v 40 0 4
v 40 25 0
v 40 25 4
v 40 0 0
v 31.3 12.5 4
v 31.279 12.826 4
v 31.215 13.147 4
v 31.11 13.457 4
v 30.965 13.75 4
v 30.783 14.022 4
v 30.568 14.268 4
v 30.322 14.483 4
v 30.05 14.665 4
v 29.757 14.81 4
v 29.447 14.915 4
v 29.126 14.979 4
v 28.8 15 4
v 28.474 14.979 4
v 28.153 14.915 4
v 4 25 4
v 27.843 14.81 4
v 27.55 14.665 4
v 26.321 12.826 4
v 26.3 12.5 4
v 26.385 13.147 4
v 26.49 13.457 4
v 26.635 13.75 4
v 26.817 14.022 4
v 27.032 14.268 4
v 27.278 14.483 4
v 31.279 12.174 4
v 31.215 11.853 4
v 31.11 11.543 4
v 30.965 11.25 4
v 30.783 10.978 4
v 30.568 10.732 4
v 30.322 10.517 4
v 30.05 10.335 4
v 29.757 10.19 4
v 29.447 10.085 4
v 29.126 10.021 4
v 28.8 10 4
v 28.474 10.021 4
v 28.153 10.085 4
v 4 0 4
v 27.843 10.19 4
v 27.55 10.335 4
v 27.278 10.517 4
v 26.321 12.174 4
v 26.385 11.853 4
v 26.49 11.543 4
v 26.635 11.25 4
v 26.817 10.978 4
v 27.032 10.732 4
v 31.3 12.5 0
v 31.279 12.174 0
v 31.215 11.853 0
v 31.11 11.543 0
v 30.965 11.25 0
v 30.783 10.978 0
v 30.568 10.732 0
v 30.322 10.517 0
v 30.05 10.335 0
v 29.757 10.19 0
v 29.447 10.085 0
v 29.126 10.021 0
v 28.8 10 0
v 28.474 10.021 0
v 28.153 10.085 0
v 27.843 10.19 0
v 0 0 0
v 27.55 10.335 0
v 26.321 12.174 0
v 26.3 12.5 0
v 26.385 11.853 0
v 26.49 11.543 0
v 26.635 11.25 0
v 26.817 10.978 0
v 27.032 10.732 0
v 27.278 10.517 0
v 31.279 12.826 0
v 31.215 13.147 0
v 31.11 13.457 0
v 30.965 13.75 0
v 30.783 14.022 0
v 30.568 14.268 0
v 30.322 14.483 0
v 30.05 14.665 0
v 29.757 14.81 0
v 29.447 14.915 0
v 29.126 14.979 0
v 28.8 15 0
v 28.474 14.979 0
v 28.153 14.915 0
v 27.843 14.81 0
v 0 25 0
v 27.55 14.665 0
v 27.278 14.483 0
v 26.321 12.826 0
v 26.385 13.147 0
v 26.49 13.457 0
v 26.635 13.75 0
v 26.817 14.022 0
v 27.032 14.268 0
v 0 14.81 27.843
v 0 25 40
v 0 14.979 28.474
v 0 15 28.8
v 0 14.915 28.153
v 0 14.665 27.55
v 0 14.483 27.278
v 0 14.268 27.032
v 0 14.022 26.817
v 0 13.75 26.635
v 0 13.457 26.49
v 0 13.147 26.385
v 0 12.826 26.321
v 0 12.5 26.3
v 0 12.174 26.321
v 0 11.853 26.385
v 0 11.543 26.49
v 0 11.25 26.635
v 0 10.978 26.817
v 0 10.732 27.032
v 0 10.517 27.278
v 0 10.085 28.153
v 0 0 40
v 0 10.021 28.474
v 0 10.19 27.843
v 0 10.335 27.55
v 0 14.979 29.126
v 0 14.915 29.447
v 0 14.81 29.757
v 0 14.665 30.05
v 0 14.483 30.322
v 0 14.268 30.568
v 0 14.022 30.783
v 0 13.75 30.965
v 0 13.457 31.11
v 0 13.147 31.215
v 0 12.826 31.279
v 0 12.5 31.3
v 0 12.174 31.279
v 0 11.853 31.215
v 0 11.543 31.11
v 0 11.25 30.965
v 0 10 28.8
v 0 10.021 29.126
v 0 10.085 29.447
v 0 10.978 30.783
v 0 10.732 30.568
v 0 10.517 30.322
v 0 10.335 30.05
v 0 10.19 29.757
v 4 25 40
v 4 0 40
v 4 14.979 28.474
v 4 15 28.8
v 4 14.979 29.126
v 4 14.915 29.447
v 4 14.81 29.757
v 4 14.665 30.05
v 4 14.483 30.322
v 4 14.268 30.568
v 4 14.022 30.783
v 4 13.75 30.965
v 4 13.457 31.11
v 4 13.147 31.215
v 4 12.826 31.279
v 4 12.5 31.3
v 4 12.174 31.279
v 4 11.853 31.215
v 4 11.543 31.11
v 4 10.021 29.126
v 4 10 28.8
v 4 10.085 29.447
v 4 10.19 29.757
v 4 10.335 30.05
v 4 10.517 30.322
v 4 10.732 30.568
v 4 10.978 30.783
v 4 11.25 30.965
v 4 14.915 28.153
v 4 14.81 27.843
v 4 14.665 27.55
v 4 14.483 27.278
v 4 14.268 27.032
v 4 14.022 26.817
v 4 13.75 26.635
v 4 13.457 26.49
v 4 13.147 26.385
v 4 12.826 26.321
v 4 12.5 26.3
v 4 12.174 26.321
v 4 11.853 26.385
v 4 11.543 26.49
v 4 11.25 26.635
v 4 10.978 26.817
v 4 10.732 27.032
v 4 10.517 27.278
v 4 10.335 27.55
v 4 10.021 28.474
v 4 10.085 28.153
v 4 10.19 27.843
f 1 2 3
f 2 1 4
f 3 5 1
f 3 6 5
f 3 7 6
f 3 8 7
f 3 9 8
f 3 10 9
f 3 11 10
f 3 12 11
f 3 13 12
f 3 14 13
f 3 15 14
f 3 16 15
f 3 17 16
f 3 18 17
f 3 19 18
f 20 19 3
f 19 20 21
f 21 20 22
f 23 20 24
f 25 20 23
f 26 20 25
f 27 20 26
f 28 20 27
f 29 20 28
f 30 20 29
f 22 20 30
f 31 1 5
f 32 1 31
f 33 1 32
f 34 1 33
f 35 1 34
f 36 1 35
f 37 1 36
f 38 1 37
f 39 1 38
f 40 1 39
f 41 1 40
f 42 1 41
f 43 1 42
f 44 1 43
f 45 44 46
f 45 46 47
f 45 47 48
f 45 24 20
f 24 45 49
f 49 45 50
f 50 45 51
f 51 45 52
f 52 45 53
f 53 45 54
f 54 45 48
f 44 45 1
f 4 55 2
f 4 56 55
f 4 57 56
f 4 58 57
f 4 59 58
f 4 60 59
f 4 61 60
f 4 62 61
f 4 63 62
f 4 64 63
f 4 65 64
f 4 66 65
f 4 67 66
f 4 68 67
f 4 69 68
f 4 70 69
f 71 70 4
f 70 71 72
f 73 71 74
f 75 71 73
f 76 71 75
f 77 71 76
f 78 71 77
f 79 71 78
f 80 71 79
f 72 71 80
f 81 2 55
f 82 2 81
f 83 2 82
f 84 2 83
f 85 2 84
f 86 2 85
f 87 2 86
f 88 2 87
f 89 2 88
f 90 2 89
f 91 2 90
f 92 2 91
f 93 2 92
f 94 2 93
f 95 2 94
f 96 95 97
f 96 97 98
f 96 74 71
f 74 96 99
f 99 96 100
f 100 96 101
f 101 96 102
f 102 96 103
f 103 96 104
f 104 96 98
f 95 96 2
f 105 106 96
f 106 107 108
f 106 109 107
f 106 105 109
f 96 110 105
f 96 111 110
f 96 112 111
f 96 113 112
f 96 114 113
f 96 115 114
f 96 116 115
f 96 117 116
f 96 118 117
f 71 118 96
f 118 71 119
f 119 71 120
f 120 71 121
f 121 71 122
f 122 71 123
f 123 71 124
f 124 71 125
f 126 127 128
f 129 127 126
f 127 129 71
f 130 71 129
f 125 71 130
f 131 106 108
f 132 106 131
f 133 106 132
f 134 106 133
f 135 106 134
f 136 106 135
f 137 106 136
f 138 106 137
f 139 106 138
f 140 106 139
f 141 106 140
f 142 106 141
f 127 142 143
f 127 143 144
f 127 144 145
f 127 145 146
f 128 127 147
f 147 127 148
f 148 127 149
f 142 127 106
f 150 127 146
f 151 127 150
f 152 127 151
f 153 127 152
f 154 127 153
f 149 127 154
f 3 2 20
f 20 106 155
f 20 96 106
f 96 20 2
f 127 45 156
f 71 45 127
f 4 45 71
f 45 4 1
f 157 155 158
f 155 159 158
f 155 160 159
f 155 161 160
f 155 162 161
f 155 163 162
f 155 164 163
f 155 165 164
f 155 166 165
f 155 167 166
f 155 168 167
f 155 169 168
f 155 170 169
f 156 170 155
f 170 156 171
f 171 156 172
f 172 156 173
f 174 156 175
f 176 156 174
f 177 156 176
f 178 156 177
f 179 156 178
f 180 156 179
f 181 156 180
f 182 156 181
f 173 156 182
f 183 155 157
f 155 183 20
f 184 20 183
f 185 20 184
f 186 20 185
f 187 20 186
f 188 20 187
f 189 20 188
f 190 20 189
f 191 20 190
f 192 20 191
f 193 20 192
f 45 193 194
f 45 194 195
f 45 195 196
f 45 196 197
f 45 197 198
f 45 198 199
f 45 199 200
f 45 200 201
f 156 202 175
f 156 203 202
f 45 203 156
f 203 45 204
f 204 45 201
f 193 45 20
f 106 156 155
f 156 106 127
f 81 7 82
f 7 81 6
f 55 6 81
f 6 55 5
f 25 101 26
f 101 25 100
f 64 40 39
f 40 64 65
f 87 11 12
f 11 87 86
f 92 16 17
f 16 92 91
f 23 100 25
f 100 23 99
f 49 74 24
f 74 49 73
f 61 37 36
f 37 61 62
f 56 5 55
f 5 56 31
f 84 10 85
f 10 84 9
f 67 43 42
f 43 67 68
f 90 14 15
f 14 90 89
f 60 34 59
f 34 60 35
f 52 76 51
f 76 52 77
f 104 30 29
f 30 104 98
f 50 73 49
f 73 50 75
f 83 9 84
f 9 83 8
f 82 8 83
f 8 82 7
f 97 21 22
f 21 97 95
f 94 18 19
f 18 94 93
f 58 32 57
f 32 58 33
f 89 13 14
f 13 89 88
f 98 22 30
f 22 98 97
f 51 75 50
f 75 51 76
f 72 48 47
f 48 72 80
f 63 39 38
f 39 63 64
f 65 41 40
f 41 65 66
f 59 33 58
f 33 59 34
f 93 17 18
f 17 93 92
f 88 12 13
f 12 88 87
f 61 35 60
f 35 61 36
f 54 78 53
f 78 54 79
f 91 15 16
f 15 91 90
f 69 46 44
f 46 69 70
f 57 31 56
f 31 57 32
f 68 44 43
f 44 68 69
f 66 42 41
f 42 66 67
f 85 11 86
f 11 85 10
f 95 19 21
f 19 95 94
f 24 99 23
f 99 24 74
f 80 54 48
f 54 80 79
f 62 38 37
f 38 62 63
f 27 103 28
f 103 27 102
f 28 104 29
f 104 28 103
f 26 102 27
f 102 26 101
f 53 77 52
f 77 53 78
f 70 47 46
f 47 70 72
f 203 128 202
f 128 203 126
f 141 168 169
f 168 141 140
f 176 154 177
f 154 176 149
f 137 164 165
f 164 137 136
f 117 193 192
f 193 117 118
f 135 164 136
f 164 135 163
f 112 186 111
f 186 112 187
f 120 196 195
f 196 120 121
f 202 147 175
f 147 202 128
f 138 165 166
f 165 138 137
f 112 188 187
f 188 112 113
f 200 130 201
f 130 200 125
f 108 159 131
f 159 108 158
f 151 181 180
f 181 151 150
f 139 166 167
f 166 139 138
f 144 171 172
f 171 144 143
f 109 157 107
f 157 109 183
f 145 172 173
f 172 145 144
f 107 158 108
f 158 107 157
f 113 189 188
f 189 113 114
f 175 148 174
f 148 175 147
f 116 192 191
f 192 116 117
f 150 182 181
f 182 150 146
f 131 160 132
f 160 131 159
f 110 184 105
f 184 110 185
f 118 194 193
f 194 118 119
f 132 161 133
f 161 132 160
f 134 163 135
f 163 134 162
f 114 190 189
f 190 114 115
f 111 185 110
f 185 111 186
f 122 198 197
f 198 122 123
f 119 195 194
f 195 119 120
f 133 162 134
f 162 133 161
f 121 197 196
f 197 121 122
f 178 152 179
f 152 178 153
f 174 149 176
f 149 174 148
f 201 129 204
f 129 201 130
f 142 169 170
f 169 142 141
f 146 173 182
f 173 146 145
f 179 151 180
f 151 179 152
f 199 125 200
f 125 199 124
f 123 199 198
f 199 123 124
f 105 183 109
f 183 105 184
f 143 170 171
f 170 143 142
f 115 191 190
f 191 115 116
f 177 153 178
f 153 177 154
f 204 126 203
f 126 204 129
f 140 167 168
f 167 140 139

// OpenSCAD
// Right-angle corner bracket - two perpendicular arms with a mounting hole in each, to
// join two surfaces at 90 degrees. NOVEL general structural part.
//
// @desc right-angle corner bracket joining two surfaces at 90 degrees
// @prompt Design a right-angle corner bracket in OpenSCAD: two perpendicular arms, each {arm} mm long, {width} mm wide and {t} mm thick, meeting at a right angle, with a {hole} mm mounting hole near the end of each arm. Reply with a single complete OpenSCAD file.
// @param arm   arm length, mm       [20:80]
// @param width width, mm            [15:50]
// @param t     plate thickness, mm  [3:8]
// @param hole  hole diameter, mm    [3:8]

arm   = 40;
width = 25;
t     = 4;
hole  = 5;

$fn = 48;

difference() {
    union() {
        cube([arm, width, t]);      // horizontal arm (along X)
        cube([t, width, arm]);      // vertical arm (along Z)
    }
    translate([arm * 0.72, width / 2, -1]) cylinder(h = t + 2, d = hole);                 // horizontal arm hole
    translate([-1, width / 2, arm * 0.72]) rotate([0, 90, 0]) cylinder(h = t + 2, d = hole);  // vertical arm hole
}
